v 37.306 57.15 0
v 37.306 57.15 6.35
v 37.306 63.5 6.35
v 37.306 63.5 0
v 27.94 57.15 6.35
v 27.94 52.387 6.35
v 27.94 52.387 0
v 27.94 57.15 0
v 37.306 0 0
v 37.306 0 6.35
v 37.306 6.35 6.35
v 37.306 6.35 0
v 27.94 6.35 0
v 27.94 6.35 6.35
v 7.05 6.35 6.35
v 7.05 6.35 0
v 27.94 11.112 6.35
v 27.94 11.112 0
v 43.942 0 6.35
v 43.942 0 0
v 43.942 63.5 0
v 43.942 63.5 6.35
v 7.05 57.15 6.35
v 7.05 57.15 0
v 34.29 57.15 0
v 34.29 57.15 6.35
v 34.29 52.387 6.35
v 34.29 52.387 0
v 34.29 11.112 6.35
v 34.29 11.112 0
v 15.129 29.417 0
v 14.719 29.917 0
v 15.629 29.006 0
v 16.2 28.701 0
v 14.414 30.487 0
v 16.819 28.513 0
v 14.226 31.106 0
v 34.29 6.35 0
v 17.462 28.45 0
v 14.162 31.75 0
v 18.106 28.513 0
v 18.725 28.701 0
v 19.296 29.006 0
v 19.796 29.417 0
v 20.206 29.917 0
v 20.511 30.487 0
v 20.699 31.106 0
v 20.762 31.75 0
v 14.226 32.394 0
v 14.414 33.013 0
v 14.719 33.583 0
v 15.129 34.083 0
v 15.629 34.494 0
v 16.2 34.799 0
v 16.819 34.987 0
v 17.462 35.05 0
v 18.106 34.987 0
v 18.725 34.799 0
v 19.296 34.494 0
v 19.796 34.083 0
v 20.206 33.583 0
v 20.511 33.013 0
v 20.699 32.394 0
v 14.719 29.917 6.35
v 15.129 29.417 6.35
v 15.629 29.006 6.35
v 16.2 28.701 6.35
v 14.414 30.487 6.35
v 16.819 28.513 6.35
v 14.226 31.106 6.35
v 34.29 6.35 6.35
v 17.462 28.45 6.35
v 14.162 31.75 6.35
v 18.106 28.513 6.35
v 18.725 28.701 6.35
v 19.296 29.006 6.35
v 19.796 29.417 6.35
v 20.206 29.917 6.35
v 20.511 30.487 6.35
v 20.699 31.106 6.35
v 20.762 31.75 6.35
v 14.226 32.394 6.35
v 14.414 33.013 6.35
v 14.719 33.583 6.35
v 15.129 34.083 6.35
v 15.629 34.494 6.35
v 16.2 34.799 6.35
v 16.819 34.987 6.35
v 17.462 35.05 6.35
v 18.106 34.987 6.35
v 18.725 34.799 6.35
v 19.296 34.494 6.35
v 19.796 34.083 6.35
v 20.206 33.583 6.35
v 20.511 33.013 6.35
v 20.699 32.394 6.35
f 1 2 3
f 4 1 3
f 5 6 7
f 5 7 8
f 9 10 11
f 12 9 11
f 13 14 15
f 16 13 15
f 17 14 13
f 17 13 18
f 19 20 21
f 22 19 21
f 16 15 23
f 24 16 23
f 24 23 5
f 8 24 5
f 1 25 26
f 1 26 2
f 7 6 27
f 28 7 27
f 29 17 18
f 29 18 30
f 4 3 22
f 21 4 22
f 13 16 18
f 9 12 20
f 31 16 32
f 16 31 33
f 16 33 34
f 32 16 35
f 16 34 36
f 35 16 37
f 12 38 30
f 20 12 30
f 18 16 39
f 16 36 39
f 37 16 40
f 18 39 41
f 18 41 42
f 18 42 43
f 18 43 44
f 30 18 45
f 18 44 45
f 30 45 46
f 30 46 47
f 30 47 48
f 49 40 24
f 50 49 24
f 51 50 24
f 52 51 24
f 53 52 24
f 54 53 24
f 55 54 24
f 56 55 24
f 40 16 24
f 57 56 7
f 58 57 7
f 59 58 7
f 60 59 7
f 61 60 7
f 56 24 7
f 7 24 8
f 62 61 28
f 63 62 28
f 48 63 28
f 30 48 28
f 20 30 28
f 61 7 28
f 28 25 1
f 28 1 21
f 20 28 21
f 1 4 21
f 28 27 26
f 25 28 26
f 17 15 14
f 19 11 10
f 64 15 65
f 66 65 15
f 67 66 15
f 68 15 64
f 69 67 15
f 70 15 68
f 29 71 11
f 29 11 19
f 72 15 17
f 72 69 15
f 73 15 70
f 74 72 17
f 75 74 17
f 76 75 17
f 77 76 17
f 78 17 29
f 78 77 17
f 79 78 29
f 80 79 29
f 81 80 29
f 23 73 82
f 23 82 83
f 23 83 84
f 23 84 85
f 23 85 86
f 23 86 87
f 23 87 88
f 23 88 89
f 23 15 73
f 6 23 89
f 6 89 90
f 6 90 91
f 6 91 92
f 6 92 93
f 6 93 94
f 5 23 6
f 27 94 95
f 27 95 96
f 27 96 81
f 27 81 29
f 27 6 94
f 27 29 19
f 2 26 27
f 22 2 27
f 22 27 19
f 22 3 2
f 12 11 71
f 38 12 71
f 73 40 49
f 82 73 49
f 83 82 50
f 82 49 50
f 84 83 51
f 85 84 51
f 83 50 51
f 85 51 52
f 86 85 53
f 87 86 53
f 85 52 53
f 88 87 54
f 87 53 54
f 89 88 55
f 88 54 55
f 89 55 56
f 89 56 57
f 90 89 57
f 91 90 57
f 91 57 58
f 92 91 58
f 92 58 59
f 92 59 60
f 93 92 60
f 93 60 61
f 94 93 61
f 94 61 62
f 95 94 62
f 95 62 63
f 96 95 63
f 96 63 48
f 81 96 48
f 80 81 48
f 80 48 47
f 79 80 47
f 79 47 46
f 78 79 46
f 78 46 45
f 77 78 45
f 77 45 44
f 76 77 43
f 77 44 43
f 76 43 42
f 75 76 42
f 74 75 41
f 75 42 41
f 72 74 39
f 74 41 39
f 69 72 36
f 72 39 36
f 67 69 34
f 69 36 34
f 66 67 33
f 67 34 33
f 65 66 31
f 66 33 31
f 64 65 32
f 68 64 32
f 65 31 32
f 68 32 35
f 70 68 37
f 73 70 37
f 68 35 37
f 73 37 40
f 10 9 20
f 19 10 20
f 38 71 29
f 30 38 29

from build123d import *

# Parameters (mm, degrees)
SKETCH2_W               = 43.942
SKETCH2_H               = 127
BOSS_EXTRUDE1_DEPTH     = 6.35
M6_CLEARANCE_HOLE1_D    = 6.6
SKETCH5_W               = 7.0505
SKETCH5_H               = 127
CUT_EXTRUDE1_DEPTH      = 1
CUT_EXTRUDE1_DEPTH_BACK = 7.35
SKETCH6_W               = 27.8745
SKETCH6_H               = 3.175
CUT_EXTRUDE2_DEPTH      = 7.35
SKETCH7_W               = 6.35
SKETCH7_H               = 4.7625
CUT_EXTRUDE3_DEPTH      = 7.35
SKETCH8_R               = 3.3
CUT_EXTRUDE4_DEPTH      = 1
CUT_EXTRUDE4_DEPTH_BACK = 7.35


with BuildPart() as part:
    # Sketch2 → Boss-Extrude1 (new body)
    with BuildSketch(Plane.XY):
        with Locations((21.971, 63.5)):
            Rectangle(SKETCH2_W, SKETCH2_H)
    extrude(amount=BOSS_EXTRUDE1_DEPTH)

    # M6 Clearance Hole1 (through all)
    with Locations(Plane.XY.offset(6.35)):
        with Locations((17.4625, 31.75), (17.4625, 95.25)):
            Hole(M6_CLEARANCE_HOLE1_D / 2)

    # Sketch5 → Cut-Extrude1 (cut, two sides)
    with BuildSketch(Plane.XY.offset(6.35)) as cut_extrude1_sk:
        with Locations((3.52525, 63.5)):
            Rectangle(SKETCH5_W, SKETCH5_H)
    extrude(amount=CUT_EXTRUDE1_DEPTH, mode=Mode.SUBTRACT)
    extrude(cut_extrude1_sk.sketch, amount=-CUT_EXTRUDE1_DEPTH_BACK, mode=Mode.SUBTRACT)

    # Sketch6 → Cut-Extrude2 (cut, through all)
    with BuildSketch(Plane.XY.offset(6.35)):
        Polygon((7.0505, 123.825), (7.0505, 120.65), (37.30625, 120.65), (37.30625, 127), (34.925, 127), (34.925, 123.825), align=None)
        with Locations((20.98775, 125.4125)):
            Rectangle(SKETCH6_W, SKETCH6_H)
        Polygon((37.30625, 66.675), (7.0505, 66.675), (7.0505, 63.5), (34.925, 63.5), (34.925, 60.325), (7.0505, 60.325), (7.0505, 57.15), (37.30625, 57.15), align=None)
        with Locations((20.98775, 61.9125)):
            Rectangle(SKETCH6_W, SKETCH6_H)
        Polygon((37.30625, 0), (37.30625, 6.35), (7.0505, 6.35), (7.0505, 3.175), (34.925, 3.175), (34.925, 0), align=None)
        with Locations((20.98775, 1.5875)):
            Rectangle(SKETCH6_W, SKETCH6_H)
    extrude(amount=-CUT_EXTRUDE2_DEPTH, mode=Mode.SUBTRACT)

    # Sketch7 → Cut-Extrude3 (cut, through all)
    with BuildSketch(Plane.XY.offset(6.35)):
        with Locations((31.115, 118.26875)):
            Rectangle(SKETCH7_W, SKETCH7_H)
        with Locations((31.115, 69.05625)):
            Rectangle(SKETCH7_W, SKETCH7_H)
        with Locations((31.115, 54.76875)):
            Rectangle(SKETCH7_W, SKETCH7_H)
        with Locations((31.115, 8.73125)):
            Rectangle(SKETCH7_W, SKETCH7_H)
    extrude(amount=-CUT_EXTRUDE3_DEPTH, mode=Mode.SUBTRACT)

    # Sketch8 → Cut-Extrude4 (cut, two sides)
    with BuildSketch(Plane.XY.offset(6.35)) as cut_extrude4_sk:
        Polygon((37.30625, 66.675), (37.30625, 63.5), (43.942, 63.5), (43.942, 127), (37.30625, 127), (37.30625, 120.65), (34.29, 120.65), (34.29, 115.8875), (27.94, 115.8875), (27.94, 120.65), (7.0505, 120.65), (7.0505, 66.675), (27.94, 66.675), (27.94, 71.4375), (34.29, 71.4375), (34.29, 66.675), align=None)
        with Locations((17.4625, 95.25)):
            Circle(SKETCH8_R, mode=Mode.SUBTRACT)
    extrude(amount=CUT_EXTRUDE4_DEPTH, mode=Mode.SUBTRACT)
    extrude(cut_extrude4_sk.sketch, amount=-CUT_EXTRUDE4_DEPTH_BACK, mode=Mode.SUBTRACT)


solid = part.part
